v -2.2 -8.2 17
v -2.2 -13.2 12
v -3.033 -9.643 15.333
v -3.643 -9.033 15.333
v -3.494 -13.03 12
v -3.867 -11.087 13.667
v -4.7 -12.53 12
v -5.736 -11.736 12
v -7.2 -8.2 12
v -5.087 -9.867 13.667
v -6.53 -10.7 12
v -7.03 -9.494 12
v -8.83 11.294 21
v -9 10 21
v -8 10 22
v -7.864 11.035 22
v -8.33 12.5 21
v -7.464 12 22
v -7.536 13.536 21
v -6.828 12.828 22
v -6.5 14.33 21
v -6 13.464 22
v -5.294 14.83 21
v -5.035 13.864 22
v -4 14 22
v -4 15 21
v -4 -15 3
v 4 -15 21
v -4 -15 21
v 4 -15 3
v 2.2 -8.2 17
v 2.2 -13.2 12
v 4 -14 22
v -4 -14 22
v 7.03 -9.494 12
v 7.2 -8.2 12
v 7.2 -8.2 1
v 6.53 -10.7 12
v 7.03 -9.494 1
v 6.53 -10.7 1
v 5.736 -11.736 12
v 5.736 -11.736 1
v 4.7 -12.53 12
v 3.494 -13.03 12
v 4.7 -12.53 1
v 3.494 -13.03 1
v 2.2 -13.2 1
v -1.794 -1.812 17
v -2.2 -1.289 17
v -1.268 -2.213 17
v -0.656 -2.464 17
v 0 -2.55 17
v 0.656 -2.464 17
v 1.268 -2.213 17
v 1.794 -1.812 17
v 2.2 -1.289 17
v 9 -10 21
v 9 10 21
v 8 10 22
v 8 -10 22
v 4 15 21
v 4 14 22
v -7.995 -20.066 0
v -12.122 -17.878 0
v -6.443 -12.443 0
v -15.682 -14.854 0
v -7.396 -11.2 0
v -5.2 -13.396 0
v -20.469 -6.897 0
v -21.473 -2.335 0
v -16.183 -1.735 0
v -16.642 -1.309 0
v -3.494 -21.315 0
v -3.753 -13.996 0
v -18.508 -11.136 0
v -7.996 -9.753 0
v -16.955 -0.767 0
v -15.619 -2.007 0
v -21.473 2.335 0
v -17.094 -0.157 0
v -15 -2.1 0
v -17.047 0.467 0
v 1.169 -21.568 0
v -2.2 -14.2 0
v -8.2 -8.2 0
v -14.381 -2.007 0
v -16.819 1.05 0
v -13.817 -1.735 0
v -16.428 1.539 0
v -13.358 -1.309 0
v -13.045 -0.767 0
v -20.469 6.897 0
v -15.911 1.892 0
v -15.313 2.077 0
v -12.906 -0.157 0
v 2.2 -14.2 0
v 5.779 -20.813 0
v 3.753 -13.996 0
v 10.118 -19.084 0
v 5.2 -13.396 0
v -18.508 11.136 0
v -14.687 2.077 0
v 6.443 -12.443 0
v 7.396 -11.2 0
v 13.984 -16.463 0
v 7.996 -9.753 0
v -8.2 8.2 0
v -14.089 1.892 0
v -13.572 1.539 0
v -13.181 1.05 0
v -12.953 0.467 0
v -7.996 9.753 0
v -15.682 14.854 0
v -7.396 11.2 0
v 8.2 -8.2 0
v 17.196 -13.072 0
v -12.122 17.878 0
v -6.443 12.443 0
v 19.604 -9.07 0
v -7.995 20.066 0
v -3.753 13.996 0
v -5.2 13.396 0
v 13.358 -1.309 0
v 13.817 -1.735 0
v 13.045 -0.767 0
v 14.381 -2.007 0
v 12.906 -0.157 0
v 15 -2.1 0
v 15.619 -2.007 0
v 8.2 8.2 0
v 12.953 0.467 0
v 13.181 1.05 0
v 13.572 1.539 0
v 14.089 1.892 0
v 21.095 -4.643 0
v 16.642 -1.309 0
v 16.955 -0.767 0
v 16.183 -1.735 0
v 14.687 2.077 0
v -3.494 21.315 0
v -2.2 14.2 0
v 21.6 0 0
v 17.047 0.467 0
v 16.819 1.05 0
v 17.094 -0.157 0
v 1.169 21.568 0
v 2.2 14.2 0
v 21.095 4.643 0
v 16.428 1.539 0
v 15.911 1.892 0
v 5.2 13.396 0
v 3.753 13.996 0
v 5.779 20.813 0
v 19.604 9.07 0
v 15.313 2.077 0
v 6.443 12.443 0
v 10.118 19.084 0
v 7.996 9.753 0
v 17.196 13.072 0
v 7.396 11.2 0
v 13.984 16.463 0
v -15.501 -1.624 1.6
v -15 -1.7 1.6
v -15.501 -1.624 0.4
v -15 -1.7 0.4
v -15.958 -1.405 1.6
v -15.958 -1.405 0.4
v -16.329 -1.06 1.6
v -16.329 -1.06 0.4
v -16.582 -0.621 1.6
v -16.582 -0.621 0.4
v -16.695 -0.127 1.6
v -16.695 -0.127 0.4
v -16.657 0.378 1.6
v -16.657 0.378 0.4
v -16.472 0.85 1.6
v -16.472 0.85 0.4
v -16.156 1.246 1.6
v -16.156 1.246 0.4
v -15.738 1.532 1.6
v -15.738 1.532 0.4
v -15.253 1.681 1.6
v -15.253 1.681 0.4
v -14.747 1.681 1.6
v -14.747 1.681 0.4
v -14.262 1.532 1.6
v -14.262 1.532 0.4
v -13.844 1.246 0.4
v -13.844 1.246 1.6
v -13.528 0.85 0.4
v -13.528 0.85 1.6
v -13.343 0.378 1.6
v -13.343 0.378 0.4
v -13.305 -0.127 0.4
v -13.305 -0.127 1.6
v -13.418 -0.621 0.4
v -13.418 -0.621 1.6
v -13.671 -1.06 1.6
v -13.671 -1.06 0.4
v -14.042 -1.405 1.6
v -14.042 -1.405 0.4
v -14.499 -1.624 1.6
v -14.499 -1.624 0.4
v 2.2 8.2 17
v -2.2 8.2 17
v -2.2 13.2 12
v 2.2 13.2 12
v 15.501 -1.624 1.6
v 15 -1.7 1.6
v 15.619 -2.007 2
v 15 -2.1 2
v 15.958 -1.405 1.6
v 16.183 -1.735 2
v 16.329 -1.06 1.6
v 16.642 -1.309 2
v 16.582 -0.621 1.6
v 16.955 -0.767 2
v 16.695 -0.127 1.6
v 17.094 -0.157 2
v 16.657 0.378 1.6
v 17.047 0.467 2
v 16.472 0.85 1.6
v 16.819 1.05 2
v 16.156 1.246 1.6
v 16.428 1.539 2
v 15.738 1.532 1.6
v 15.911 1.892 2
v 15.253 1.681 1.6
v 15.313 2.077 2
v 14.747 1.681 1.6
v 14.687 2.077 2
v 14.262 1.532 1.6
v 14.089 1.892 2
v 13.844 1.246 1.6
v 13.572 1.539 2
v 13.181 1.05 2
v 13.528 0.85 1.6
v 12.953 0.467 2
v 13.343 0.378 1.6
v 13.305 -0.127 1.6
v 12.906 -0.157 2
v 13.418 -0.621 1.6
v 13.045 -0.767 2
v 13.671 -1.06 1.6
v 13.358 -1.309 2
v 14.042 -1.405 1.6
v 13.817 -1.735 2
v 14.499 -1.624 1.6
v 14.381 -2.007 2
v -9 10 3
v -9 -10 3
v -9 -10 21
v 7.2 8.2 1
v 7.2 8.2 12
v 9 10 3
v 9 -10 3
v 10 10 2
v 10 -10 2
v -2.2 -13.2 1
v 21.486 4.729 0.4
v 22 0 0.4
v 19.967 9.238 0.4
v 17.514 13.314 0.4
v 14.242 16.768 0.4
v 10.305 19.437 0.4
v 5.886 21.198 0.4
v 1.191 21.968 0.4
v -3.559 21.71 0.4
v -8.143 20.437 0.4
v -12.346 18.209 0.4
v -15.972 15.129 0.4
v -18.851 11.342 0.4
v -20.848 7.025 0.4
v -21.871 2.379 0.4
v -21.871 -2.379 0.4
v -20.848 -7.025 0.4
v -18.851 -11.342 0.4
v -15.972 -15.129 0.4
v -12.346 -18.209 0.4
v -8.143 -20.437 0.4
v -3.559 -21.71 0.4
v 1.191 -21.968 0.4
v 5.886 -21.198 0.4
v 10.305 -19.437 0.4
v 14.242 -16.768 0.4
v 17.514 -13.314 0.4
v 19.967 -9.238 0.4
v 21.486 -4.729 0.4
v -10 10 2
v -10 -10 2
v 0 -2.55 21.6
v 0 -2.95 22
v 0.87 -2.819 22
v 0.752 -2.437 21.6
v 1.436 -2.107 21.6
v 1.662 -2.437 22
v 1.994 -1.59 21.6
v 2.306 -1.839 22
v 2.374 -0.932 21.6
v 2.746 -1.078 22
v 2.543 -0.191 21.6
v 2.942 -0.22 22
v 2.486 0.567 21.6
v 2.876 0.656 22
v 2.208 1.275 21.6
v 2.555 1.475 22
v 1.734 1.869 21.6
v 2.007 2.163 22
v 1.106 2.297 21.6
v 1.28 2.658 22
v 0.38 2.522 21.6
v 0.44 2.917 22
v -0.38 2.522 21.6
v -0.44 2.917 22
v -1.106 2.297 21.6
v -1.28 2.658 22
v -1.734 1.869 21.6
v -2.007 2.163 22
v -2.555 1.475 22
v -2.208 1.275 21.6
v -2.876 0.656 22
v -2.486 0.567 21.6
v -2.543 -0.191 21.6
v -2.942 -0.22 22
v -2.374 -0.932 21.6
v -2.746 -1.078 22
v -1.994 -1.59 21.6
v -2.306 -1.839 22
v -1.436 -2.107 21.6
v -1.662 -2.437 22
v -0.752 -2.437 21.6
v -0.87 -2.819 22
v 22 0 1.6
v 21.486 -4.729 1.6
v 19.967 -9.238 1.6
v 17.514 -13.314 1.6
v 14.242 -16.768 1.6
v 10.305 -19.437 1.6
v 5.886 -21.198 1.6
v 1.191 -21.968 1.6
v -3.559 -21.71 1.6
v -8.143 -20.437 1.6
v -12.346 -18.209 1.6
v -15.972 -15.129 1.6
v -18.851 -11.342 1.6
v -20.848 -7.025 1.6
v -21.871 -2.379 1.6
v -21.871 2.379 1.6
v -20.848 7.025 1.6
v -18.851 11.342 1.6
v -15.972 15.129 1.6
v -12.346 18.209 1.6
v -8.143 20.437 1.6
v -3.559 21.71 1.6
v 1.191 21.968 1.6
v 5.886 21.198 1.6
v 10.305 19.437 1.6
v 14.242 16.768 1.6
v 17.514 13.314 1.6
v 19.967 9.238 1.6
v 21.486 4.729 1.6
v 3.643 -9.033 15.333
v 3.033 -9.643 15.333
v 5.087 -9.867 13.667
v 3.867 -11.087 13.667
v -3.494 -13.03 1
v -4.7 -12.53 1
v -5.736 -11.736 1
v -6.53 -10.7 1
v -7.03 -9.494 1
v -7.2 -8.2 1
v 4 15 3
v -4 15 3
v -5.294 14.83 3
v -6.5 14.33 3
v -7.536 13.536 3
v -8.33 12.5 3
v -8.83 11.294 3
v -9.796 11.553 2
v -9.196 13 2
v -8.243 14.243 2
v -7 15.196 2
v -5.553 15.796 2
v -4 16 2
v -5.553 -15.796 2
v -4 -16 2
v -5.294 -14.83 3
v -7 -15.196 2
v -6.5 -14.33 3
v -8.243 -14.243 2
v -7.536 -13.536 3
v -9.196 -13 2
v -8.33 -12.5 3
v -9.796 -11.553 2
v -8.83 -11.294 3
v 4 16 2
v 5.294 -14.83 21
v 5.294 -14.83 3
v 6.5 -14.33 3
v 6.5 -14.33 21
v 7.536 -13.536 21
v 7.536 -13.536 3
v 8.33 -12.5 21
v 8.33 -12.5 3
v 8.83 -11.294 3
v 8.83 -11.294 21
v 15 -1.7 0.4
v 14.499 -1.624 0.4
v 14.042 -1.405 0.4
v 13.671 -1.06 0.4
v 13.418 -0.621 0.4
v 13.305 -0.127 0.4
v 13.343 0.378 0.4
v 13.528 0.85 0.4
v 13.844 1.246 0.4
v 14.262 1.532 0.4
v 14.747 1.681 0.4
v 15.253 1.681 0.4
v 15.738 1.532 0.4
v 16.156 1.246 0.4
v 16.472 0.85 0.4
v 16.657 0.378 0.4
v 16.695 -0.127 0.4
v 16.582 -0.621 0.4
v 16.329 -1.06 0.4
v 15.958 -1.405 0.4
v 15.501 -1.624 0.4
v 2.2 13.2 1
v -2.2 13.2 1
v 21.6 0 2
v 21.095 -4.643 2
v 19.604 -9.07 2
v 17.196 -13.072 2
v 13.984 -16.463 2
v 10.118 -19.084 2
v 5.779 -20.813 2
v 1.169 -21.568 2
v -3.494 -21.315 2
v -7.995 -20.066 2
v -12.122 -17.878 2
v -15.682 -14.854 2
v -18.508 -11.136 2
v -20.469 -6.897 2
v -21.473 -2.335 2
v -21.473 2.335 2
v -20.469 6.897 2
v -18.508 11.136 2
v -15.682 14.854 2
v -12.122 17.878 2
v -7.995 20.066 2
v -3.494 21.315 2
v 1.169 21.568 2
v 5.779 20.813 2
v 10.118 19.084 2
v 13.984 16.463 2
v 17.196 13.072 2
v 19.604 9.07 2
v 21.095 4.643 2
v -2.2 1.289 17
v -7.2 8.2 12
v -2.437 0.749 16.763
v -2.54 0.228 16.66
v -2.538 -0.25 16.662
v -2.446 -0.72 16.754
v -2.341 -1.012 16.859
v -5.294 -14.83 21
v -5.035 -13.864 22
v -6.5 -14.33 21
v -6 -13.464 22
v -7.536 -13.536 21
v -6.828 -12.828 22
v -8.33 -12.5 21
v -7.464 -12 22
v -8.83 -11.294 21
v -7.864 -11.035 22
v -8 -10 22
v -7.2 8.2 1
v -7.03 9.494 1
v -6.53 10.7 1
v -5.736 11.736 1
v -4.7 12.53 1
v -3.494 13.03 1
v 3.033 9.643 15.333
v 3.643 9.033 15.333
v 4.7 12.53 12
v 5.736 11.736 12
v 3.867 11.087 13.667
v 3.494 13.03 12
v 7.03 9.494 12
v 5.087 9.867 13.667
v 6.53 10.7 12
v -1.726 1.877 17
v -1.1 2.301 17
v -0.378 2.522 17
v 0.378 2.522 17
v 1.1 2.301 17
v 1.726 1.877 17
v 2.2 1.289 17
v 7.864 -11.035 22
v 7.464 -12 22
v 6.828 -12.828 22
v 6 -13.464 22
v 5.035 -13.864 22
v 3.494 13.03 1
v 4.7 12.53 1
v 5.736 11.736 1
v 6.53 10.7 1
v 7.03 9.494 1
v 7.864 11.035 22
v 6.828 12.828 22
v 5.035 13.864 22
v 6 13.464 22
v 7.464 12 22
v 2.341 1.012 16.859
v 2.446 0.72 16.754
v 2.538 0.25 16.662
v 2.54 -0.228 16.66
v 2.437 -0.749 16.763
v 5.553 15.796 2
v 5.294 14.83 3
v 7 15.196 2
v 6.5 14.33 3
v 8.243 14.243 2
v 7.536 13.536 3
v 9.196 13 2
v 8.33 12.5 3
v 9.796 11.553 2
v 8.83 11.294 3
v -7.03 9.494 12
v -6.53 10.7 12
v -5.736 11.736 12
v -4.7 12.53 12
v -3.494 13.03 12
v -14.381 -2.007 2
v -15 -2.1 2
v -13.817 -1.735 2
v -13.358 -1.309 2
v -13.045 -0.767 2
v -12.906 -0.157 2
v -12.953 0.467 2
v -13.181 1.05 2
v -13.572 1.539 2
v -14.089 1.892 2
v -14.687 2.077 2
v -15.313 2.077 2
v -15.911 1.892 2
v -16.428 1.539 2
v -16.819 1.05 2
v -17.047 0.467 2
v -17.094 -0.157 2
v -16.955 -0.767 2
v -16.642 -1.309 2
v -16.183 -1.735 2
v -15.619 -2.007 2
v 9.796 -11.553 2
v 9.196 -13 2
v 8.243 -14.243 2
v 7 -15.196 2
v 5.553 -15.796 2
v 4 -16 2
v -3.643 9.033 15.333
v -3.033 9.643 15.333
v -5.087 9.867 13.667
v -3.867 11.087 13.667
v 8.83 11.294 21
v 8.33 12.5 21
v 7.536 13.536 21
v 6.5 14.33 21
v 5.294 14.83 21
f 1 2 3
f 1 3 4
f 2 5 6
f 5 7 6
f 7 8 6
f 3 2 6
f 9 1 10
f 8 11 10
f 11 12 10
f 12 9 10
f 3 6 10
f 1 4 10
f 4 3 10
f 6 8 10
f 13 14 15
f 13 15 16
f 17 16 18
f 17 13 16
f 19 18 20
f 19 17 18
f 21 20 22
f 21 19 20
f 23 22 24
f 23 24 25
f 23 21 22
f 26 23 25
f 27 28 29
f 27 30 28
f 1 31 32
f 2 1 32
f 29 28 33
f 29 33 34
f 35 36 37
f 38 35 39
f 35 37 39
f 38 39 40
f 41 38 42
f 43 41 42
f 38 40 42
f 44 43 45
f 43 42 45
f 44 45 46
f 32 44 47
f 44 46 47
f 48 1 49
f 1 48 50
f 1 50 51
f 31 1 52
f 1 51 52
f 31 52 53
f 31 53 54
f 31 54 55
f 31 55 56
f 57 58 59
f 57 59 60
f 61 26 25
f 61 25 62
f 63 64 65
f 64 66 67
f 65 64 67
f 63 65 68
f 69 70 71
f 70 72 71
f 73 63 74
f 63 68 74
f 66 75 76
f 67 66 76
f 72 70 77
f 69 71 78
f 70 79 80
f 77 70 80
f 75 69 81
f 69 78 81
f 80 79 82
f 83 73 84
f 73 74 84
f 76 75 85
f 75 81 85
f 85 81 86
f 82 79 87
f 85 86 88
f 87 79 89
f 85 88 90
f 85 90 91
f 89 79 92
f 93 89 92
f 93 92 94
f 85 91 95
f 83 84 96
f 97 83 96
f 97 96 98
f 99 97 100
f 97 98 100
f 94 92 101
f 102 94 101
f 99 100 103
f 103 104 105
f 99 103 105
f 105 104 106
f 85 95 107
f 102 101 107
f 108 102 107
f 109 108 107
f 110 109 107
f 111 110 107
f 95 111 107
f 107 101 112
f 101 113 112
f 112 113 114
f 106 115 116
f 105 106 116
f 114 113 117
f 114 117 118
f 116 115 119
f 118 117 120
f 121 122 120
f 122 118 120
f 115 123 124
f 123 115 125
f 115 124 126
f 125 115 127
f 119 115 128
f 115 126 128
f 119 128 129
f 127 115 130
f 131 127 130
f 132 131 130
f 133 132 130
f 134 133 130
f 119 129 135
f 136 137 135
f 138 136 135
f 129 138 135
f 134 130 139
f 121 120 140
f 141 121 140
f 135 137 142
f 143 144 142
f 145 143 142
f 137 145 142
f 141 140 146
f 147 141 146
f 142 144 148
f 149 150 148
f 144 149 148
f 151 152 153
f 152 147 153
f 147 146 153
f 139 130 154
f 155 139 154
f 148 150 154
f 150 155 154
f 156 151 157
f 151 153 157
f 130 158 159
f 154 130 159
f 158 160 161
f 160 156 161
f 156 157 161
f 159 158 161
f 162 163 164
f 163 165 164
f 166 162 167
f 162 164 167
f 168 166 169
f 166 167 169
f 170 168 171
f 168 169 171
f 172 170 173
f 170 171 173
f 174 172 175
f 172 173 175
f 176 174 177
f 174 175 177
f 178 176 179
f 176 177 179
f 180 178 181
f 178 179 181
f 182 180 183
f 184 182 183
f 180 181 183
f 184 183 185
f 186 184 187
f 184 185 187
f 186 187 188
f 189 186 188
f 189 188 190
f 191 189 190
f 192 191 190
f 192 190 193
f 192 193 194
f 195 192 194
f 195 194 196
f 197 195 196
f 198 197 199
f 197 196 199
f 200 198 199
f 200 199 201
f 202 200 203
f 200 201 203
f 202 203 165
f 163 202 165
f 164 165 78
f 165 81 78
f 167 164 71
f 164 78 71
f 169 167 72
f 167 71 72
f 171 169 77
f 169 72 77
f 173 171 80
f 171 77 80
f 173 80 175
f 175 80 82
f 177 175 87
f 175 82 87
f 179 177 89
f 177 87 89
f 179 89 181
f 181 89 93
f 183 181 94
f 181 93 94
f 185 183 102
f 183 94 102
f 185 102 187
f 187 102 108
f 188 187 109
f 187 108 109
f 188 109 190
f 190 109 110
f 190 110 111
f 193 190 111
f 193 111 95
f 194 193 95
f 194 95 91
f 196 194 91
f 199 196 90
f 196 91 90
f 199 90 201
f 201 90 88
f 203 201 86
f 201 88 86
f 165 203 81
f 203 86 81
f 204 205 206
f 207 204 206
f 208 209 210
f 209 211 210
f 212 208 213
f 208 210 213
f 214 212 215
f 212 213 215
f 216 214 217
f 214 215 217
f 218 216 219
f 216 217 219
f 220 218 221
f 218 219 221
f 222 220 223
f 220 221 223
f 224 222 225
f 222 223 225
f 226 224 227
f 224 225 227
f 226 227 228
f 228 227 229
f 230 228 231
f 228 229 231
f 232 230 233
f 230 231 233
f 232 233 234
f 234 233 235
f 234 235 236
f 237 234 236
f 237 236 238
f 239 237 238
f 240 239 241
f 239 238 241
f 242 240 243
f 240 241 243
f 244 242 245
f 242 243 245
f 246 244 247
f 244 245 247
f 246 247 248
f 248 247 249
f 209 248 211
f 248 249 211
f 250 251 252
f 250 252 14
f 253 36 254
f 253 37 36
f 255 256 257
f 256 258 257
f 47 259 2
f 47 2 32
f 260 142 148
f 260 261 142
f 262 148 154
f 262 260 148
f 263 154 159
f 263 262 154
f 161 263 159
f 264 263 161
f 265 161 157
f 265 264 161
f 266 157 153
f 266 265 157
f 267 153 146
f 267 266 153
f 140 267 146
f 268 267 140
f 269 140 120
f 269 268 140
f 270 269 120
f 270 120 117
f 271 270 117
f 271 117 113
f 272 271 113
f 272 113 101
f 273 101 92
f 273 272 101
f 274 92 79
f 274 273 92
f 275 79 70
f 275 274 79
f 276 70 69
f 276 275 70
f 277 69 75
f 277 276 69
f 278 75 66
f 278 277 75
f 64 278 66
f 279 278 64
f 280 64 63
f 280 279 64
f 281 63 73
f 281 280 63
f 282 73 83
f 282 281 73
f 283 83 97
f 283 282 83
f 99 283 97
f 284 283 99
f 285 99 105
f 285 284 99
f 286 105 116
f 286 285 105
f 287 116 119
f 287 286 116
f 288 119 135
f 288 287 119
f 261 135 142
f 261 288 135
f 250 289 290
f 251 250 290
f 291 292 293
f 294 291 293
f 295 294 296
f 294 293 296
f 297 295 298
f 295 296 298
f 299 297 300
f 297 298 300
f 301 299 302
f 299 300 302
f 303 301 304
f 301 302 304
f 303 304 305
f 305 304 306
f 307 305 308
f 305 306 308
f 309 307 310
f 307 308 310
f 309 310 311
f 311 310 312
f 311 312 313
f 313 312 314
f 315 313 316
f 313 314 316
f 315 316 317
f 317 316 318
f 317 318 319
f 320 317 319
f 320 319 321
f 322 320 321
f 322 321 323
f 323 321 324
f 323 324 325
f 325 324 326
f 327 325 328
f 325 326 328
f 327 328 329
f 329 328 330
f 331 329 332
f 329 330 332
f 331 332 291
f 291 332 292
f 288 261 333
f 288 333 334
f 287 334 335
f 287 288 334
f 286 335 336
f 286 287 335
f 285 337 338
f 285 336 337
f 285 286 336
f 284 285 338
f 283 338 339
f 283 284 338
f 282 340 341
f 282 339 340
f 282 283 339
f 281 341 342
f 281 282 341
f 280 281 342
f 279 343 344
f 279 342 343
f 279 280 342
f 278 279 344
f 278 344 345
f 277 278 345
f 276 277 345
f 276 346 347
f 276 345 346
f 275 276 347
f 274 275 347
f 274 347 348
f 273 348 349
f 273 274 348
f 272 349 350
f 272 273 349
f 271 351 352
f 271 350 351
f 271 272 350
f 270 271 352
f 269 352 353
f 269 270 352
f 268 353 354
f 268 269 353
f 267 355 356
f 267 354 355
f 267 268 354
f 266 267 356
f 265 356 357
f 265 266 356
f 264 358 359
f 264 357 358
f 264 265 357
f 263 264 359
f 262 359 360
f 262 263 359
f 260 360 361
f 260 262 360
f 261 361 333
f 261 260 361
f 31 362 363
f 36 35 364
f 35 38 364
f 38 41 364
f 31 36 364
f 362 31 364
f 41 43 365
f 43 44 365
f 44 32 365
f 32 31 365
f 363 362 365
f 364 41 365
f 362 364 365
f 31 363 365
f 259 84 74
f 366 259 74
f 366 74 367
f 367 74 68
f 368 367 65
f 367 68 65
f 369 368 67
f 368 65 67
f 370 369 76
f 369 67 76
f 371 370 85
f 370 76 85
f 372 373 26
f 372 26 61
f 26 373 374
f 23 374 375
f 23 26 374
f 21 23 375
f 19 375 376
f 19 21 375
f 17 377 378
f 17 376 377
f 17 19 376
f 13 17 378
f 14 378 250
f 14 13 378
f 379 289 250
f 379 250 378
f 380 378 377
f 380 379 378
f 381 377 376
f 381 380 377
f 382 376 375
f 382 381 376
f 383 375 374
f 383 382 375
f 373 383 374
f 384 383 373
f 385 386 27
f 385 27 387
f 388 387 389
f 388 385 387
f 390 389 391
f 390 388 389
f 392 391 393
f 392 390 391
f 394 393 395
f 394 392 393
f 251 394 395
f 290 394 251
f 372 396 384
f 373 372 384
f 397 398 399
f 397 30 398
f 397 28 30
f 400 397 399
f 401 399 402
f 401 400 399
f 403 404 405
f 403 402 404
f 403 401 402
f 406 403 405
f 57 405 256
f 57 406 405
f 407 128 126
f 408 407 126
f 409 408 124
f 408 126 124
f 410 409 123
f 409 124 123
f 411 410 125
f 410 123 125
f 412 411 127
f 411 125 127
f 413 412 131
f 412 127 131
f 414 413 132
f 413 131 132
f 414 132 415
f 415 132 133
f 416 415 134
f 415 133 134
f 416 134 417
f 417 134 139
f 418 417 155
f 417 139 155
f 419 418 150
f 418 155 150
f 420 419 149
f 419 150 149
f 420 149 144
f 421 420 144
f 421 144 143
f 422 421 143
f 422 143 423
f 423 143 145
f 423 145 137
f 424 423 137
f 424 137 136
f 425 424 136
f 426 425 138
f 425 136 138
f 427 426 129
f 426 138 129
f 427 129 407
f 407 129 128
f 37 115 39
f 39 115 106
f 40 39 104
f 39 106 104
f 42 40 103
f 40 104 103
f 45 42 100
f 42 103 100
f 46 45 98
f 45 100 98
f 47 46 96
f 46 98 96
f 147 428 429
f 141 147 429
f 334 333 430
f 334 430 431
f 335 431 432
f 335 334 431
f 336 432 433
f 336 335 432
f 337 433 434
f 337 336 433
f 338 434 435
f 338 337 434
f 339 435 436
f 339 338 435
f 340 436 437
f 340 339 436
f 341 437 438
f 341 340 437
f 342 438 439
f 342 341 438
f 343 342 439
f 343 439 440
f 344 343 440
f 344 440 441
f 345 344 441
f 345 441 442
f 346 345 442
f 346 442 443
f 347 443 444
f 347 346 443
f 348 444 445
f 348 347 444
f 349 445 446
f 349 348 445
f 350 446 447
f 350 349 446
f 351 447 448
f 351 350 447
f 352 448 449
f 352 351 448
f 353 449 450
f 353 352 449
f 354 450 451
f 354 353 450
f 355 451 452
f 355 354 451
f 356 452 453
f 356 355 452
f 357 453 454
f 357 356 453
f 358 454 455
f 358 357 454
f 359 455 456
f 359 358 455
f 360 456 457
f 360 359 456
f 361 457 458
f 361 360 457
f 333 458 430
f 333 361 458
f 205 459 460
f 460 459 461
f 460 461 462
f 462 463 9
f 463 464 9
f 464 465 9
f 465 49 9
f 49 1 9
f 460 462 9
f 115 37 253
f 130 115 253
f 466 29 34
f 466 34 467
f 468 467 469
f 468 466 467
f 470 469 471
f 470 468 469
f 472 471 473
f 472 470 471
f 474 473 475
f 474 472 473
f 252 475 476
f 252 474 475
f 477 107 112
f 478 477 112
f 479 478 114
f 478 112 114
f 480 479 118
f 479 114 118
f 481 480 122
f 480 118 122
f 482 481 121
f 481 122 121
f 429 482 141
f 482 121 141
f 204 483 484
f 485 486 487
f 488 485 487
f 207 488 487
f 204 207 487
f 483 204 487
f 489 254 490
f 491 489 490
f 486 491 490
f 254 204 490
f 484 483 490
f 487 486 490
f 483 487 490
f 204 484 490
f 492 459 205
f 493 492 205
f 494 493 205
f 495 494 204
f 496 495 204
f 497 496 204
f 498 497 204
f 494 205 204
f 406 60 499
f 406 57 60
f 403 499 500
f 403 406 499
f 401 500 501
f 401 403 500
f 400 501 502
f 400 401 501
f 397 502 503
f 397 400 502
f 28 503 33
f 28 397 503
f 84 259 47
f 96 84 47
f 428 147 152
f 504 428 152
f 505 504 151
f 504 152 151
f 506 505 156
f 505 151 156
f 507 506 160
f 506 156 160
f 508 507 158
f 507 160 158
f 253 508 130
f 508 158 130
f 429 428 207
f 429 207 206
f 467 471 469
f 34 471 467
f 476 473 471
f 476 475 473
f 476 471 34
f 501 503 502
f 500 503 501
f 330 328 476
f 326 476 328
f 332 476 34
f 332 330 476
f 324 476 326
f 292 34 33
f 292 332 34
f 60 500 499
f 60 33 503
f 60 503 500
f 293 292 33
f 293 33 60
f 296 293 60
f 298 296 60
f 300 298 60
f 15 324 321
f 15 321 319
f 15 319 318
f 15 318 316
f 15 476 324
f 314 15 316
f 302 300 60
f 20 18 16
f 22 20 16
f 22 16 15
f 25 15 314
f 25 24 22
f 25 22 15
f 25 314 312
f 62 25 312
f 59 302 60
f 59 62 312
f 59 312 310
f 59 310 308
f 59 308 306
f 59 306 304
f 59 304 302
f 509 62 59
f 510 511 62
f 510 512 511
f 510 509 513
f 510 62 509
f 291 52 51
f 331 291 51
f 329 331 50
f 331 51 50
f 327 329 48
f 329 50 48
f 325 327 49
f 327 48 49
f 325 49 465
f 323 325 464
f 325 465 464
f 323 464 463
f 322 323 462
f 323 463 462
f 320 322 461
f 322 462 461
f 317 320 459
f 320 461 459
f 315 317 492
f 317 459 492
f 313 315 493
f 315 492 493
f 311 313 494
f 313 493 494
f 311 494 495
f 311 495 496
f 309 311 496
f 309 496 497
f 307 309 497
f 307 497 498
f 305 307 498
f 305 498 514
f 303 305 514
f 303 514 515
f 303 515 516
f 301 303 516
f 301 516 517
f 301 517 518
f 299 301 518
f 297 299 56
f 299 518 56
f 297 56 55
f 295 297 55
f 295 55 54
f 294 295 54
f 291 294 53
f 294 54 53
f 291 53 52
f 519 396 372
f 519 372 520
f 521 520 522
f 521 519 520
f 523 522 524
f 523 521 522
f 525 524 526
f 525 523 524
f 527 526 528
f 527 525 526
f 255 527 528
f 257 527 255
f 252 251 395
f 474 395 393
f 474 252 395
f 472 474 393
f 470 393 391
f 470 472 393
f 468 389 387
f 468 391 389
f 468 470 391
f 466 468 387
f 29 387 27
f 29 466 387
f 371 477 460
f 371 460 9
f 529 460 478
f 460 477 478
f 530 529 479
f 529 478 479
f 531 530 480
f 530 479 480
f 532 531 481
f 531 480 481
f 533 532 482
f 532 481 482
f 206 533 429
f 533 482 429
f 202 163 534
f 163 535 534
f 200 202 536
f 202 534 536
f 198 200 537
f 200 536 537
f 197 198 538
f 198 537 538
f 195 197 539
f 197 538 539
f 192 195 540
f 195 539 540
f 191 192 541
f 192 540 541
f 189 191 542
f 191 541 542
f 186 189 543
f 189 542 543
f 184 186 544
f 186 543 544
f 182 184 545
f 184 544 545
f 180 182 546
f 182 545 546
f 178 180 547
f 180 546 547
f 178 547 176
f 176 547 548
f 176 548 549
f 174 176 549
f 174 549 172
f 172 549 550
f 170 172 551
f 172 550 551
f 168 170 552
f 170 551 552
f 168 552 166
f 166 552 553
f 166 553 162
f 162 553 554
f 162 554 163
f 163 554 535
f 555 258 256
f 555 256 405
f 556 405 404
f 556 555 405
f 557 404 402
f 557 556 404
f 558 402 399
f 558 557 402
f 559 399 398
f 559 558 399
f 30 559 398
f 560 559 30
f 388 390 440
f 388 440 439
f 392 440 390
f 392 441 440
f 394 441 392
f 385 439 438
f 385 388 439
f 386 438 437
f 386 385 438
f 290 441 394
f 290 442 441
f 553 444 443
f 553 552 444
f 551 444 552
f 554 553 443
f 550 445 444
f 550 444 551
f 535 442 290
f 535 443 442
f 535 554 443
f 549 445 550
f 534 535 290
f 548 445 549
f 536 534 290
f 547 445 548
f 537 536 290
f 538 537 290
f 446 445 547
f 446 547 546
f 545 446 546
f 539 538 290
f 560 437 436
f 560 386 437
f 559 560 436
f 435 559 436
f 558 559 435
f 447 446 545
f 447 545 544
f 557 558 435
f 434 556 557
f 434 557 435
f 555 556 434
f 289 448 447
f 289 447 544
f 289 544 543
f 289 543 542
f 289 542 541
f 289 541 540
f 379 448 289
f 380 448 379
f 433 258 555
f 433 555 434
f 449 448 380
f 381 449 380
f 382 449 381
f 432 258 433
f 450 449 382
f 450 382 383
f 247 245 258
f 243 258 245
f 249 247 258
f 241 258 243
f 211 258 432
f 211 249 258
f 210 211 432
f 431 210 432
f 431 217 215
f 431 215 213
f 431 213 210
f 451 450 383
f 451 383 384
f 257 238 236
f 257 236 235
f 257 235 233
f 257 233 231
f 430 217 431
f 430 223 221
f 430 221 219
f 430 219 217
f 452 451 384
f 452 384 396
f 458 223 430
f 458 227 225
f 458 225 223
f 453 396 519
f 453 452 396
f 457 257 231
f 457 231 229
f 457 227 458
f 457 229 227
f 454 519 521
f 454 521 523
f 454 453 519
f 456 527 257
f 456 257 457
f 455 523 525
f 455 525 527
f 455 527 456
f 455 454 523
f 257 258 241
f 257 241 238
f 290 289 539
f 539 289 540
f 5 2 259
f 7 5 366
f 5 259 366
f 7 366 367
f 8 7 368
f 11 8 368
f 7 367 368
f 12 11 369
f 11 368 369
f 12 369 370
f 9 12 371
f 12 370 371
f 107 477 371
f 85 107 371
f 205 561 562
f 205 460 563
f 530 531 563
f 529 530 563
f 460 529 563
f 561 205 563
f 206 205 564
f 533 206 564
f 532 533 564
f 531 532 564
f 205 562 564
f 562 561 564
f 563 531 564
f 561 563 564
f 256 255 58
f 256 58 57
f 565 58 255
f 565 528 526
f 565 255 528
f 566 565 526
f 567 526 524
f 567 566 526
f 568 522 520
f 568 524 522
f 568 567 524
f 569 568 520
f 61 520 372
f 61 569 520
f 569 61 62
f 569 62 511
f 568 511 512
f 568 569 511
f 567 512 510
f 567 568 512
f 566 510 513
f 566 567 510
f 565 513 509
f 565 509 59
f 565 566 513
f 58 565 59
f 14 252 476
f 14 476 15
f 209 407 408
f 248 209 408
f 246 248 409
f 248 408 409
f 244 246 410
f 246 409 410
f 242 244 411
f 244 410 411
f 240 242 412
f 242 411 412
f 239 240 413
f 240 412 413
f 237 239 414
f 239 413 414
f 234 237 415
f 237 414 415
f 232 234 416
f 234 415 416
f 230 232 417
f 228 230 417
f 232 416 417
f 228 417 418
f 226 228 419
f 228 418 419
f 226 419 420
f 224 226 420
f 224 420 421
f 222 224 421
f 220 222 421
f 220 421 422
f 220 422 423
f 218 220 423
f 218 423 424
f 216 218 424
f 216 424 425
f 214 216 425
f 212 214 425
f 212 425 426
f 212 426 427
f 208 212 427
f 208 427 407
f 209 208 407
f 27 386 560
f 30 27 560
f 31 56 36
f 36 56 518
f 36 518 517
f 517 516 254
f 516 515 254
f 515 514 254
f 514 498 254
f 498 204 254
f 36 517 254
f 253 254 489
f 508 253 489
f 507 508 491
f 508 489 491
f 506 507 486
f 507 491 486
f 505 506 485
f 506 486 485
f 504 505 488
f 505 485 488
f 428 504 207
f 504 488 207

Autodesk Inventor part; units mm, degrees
ref_plane "YZ Plane" through (0, 0, 0) normal (1, 0, 0) x (0, 1, 0)
ref_plane "XZ Plane" through (0, 0, 0) normal (0, 1, 0) x (-1, 0, 0)
ref_plane "XY Plane" through (0, 0, 0) normal (0, 0, 1) x (1, 0, 0)
sketch "Sketch1" plane through (0, 0, 0) normal (0, 0, 1) x (1, 0, 0)
  circle A0 centre (0, 0) radius 22
  dimension "d0" = 44
extrude "Extrusion1" add sketch "Sketch1" along normal blind 2
sketch "Sketch2" plane through (0, 0, 2) normal (0, 0, 1) x (1, 0, 0)
  line L0 (-15, 0) -> (15, 0) construction
  point P0 (0, 0)
  point P1 (0, 0)
  dimension "d3" = 30
hole "Hole1" at (-15, 0, 2) at (15, 0, 2) direction (0, 0, -1) diameter 3.4 end through all
sketch "Sketch3" plane through (0, 0, 2) normal (0, 0, 1) x (1, 0, 0)
  line L0 (-9, 15) -> (9, 15)
  line L1 (9, 15) -> (9, -15)
  line L2 (9, -15) -> (-9, -15)
  line L3 (-9, -15) -> (-9, 15)
  line L4 (7.2, 13.2) -> (-7.2, 13.2)
  line L5 (-7.2, 13.2) -> (-7.2, -13.2)
  line L6 (-7.2, -13.2) -> (7.2, -13.2)
  line L7 (7.2, -13.2) -> (7.2, 13.2)
  point P0 (0, 0)
  point P1 (9, 0)
  point P2 (0, 15)
  dimension "d11" = 30
  dimension "d12" = 18
  dimension "d13" = 1.8
extrude "Extrusion2" cut sketch "Sketch3" against normal blind 2 contours L7 L6 L5 L4
extrude "Extrusion3" add sketch "Sketch3" along normal blind 20
sketch "Sketch4" plane through (0, 0, 22) normal (0, 0, 1) x (1, 0, 0)
  line L0 (-9, -15) -> (9, -15) projected
  line L1 (9, -15) -> (9, 15) projected
  line L2 (9, 15) -> (-9, 15) projected
  line L3 (-9, 15) -> (-9, -15) projected
  line L4 (7.2, 13.2) -> (7.2, -13.2) projected
  line L5 (7.2, -13.2) -> (-7.2, -13.2) projected
  line L6 (-7.2, -13.2) -> (-7.2, 13.2) projected
  line L7 (-7.2, 13.2) -> (7.2, 13.2) projected
  point P0 (0, 0)
extrude "Extrusion4" add sketch "Sketch4" against normal blind 5 contours L4 L5 L6 L7
sketch "Sketch5" plane through (0, 0, 22) normal (0, 0, 1) x (1, 0, 0)
  point P0 (0, 0)
  point P1 (0, 0)
hole "Hole2" at (0, 0, 22) direction (0, 0, -1) diameter 5.1 end through all
fillet "Fillet1" radius 5 8 edges at (-7.2, -13.2, 8.5) (7.2, -13.2, 8.5) (-7.2, 13.2, 8.5) (7.2, 13.2, 8.5) (9, 15, 12) (-9, 15, 12) (-9, -15, 12) (9, -15, 12)
chamfer "Chamfer1" distance 5 angle 45 8 edges at (0, 13.2, 17) (-5.7355, 11.7355, 17) (-7.2, 0, 17) (-5.7355, -11.7355, 17) (0, -13.2, 17) (5.7355, -11.7355, 17) (7.2, 0, 17) (5.7355, 11.7355, 17)
chamfer "Chamfer2" distance 1 angle 45 24 edges at (0, 15, 22) (-7.5355, 13.5355, 22) (-9, 0, 22) (-7.5355, -13.5355, 22) (0, -15, 22) (7.5355, -13.5355, 22) (9, 0, 22) (7.5355, 13.5355, 22) (9, 0, 2) (7.5355, -13.5355, 2) (0, -15, 2) (-7.5355, -13.5355, 2) (-9, 0, 2) (-7.5355, 13.5355, 2) (0, 15, 2) (7.5355, 13.5355, 2) (7.2, 0, 0) (5.7355, 11.7355, 0) (0, 13.2, 0) (-5.7355, 11.7355, 0) (-7.2, 0, 0) (-5.7355, -11.7355, 0) (0, -13.2, 0) (5.7355, -11.7355, 0)
chamfer "Chamfer3" distance 0.4 angle 45 7 edges at (-22, 0, 2) (-22, 0, 0) (15, 1.7, 2) (-15, 1.7, 2) (-15, 1.7, 0) (15, 1.7, 0) (0, 2.55, 22)
properties part number "takumar-slit-led" material "ABS Plastic"
